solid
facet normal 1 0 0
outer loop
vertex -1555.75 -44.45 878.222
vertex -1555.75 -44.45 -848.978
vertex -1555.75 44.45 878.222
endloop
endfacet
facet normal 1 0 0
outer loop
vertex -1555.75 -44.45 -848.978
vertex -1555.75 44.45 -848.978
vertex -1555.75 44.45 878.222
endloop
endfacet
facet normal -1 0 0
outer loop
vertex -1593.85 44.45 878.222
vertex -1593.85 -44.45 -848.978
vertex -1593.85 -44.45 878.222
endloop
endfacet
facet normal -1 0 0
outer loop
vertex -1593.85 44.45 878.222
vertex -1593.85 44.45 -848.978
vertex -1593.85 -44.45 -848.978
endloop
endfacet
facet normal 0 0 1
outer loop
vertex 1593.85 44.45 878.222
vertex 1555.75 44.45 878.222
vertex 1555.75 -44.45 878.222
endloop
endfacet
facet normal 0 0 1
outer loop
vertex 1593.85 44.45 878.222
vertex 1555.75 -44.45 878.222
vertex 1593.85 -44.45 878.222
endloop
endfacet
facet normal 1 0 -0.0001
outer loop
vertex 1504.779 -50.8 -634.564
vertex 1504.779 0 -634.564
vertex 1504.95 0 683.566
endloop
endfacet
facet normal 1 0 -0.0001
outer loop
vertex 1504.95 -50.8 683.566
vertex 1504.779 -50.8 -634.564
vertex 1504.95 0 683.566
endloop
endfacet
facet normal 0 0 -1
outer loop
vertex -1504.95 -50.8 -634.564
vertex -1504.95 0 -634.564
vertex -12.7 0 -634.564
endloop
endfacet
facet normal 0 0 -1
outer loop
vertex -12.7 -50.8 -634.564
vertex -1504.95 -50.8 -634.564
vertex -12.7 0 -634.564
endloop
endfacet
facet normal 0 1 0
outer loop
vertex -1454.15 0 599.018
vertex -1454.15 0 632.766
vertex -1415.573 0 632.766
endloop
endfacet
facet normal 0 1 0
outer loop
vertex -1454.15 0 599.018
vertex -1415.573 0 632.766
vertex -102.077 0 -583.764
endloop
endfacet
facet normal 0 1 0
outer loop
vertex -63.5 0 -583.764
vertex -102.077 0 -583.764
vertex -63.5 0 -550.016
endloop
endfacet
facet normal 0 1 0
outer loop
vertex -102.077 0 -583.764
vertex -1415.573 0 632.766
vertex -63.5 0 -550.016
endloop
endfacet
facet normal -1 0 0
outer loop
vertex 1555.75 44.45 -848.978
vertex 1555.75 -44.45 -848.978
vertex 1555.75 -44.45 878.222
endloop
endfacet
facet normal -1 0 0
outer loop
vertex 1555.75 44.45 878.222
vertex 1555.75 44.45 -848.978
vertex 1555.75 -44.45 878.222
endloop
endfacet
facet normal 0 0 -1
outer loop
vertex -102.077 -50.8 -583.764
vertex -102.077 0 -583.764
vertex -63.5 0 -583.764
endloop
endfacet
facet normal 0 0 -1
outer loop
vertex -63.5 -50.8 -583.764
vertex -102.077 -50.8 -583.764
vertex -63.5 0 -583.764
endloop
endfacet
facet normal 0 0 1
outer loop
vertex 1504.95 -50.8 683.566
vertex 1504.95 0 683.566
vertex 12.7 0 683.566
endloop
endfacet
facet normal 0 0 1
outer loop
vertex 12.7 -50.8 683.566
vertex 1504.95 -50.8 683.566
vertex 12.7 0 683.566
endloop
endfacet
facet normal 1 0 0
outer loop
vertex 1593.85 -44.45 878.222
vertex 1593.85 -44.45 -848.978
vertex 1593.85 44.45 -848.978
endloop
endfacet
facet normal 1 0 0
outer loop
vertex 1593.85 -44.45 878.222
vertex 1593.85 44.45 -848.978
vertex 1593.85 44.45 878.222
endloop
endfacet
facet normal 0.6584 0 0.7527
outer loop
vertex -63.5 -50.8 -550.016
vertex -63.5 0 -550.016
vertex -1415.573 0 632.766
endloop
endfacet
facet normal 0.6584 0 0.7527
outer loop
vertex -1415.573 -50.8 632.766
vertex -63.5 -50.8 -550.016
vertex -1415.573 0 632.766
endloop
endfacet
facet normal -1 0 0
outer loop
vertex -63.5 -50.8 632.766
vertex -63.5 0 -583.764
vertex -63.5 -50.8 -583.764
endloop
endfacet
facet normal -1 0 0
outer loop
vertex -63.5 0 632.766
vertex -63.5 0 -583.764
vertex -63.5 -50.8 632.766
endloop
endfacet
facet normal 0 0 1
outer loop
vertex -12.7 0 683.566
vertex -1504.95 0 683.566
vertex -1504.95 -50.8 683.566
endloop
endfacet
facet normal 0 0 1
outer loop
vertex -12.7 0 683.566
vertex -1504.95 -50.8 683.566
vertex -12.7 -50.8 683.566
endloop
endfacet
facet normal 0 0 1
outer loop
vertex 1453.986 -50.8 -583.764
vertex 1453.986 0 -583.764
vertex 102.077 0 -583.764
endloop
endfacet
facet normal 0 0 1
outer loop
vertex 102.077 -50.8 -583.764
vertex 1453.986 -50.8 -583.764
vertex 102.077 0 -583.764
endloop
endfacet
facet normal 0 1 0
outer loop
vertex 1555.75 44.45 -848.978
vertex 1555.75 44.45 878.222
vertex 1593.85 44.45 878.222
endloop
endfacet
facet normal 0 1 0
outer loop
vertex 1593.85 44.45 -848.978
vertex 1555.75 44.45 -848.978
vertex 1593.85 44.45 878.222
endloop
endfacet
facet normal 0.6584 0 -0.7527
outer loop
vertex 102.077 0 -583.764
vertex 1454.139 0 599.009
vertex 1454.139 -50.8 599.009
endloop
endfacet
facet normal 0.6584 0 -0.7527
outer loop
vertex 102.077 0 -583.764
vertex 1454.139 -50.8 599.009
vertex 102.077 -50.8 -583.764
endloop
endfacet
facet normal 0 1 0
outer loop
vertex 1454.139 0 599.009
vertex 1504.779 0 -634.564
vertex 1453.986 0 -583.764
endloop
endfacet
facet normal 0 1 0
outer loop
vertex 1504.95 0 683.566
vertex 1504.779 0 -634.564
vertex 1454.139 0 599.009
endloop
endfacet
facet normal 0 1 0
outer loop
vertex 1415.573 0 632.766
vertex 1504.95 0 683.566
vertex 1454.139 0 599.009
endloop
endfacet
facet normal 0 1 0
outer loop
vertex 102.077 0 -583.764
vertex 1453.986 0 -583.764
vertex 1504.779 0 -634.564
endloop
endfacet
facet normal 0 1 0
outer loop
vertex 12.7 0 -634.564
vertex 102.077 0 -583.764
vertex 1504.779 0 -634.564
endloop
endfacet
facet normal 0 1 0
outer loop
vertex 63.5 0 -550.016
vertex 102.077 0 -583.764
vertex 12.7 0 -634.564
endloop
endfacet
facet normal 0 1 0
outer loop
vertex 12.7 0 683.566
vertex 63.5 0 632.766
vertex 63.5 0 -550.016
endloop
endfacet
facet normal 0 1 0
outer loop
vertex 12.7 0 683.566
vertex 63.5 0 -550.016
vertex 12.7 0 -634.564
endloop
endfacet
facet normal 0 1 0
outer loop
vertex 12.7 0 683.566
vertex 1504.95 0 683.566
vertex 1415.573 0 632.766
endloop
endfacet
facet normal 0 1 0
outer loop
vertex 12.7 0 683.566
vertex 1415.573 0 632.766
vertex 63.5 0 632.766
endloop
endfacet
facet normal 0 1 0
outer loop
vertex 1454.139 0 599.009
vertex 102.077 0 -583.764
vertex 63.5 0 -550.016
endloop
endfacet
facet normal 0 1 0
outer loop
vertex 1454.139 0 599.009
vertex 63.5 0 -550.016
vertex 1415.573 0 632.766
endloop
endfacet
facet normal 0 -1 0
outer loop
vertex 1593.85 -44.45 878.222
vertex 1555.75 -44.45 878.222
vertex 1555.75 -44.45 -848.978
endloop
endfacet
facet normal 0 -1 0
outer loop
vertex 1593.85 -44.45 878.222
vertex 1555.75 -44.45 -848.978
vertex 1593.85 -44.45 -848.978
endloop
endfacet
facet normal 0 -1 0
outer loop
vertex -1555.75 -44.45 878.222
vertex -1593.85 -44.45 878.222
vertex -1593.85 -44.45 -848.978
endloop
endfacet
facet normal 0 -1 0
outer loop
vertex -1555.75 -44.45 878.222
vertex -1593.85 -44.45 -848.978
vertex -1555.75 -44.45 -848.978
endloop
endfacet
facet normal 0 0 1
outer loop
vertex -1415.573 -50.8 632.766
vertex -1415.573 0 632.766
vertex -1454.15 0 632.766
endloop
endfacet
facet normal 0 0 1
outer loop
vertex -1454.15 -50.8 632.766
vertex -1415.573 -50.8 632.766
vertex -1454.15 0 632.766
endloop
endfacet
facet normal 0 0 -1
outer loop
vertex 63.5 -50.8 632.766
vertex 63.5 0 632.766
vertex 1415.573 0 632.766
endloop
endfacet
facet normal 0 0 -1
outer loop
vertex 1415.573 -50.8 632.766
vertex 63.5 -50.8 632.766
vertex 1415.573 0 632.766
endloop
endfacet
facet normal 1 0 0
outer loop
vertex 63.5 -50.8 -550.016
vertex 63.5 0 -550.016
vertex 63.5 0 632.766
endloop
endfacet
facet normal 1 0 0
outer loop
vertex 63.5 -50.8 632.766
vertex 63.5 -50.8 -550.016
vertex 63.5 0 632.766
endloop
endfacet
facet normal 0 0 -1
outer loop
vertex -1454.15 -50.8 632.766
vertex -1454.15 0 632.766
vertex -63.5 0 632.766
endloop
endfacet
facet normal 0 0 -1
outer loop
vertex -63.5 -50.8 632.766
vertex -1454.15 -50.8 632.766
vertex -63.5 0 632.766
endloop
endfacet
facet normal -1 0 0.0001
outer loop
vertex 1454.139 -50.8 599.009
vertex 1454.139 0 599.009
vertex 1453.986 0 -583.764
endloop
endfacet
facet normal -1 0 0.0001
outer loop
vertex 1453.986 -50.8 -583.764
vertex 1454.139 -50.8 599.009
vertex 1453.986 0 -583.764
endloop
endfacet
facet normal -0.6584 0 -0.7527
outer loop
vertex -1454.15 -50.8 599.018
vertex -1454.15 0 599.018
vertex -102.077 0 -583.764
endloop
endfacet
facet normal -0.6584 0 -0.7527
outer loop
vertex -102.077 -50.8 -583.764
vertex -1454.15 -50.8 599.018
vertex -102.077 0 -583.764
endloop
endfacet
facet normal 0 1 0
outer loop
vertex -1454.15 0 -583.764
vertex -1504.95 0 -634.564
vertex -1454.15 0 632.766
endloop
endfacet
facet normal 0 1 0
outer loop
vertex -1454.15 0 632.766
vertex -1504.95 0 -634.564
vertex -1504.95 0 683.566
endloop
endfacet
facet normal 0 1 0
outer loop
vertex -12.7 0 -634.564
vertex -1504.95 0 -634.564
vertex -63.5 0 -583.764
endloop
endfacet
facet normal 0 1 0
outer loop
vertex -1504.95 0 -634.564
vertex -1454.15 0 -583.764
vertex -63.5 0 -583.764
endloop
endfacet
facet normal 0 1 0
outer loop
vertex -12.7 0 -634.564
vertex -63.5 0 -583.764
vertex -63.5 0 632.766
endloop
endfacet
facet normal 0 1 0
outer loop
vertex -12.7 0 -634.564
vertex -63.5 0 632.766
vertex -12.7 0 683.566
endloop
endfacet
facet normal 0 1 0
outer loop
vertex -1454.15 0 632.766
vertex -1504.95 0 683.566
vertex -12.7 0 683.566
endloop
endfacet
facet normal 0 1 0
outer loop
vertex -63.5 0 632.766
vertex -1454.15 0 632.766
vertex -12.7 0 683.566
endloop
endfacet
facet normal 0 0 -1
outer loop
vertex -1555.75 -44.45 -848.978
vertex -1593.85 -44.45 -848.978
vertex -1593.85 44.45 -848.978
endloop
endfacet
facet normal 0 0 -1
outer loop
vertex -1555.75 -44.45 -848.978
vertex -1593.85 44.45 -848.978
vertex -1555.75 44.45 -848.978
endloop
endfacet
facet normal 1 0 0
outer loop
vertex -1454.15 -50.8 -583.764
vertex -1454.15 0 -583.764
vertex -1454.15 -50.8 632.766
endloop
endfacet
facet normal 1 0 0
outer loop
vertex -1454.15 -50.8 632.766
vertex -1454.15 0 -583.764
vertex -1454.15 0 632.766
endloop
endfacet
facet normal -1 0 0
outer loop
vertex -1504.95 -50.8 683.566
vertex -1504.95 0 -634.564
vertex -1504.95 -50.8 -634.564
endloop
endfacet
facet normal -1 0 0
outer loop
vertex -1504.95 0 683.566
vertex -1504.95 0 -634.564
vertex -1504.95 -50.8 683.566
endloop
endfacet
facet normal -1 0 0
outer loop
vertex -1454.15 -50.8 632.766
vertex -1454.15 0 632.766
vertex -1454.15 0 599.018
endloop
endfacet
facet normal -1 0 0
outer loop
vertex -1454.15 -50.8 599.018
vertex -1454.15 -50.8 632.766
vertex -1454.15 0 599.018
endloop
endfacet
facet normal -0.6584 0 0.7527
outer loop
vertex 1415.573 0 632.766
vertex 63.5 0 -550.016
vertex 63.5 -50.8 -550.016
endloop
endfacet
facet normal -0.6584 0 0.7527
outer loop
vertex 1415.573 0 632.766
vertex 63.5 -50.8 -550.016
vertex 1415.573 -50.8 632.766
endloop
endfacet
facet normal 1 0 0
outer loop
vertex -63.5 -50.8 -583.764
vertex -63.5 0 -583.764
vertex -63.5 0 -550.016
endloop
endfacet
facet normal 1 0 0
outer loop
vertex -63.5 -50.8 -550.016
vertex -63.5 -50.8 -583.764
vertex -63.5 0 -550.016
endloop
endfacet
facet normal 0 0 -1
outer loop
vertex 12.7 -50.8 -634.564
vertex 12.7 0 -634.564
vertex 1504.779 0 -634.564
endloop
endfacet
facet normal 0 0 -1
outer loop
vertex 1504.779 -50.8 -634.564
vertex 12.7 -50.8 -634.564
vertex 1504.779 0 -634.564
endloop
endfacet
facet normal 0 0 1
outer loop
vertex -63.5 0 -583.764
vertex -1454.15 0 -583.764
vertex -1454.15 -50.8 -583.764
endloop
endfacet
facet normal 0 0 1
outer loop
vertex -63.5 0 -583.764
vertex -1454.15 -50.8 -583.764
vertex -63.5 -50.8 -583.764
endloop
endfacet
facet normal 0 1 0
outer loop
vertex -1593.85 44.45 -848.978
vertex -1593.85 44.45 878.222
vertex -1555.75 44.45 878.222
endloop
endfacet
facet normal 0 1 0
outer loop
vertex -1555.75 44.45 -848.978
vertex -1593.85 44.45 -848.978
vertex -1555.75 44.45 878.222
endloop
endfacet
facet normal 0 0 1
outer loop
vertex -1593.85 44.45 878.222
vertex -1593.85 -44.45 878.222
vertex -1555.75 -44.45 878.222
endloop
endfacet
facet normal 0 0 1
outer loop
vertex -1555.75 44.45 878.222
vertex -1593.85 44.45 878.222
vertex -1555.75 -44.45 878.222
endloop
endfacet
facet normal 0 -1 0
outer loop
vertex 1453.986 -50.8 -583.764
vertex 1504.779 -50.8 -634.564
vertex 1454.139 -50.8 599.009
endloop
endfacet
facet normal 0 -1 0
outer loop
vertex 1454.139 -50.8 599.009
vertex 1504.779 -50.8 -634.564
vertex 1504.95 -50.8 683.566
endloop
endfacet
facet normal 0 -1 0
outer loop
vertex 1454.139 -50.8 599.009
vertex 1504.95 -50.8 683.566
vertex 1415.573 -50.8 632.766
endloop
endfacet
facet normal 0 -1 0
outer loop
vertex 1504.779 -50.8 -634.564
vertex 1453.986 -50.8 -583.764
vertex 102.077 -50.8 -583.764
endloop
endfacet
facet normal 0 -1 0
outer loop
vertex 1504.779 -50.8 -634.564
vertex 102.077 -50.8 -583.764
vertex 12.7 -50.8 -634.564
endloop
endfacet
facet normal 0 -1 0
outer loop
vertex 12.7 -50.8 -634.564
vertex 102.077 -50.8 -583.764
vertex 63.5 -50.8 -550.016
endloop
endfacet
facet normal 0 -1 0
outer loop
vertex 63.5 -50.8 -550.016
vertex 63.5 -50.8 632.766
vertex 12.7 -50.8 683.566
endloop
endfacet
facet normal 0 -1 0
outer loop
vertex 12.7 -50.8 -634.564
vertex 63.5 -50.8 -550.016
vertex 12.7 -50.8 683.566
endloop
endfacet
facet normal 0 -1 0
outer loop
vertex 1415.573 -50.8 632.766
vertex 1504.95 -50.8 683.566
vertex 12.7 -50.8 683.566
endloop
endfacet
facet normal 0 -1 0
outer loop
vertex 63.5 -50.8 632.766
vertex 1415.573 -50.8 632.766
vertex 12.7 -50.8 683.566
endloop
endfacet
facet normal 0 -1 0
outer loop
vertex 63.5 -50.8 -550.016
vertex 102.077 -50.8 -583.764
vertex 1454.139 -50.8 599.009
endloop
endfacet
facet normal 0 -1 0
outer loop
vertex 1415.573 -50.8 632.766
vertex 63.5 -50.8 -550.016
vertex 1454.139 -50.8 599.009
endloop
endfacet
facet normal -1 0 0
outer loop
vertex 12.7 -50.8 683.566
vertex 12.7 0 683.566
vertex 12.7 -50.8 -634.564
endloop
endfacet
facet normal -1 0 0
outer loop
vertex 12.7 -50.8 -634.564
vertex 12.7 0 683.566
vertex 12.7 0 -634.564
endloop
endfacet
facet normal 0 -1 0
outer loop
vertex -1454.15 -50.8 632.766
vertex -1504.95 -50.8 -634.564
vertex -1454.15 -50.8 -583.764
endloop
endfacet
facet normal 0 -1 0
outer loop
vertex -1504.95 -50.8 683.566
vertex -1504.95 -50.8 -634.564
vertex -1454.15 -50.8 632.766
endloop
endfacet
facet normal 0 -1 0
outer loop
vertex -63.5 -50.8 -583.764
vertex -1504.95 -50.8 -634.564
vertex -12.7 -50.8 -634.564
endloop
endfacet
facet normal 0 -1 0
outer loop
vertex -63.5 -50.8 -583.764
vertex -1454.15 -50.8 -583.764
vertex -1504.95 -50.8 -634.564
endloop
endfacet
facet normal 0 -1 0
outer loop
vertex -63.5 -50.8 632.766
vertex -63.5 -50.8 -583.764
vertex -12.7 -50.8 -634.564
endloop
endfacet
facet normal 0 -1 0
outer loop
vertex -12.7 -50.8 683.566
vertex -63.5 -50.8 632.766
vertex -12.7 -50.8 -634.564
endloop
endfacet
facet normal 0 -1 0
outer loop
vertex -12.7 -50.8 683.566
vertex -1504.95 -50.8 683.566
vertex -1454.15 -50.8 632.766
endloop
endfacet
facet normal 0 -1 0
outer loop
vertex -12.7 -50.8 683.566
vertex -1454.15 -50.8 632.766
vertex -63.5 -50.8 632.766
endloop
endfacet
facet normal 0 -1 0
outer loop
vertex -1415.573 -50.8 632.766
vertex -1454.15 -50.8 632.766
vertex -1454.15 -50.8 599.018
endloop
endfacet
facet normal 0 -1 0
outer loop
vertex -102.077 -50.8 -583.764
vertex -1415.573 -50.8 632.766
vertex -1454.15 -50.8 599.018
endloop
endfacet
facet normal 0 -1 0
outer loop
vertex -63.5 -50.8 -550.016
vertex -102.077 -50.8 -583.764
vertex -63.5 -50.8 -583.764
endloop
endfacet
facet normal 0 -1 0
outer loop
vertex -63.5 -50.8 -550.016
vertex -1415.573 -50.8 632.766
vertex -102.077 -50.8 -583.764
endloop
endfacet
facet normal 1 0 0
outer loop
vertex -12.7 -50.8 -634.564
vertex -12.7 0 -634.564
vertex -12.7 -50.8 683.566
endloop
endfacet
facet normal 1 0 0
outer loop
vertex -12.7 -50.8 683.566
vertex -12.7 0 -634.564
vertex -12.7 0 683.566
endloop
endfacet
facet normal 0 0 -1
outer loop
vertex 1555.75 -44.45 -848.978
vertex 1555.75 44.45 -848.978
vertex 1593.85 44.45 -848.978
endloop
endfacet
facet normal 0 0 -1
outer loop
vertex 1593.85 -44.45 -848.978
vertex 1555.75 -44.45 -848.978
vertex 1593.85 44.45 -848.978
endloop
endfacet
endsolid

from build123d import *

# Parameters (mm, degrees)
F0_W     = 38.1
F0_H     = 1727.2
F1_DEPTH = 44.45
F3_W     = 1492.25
F3_H     = 1318.129241
F3_W_2   = 1390.65
F3_H_2   = 1216.529241
F4_DEPTH = 50.8
F6_DEPTH = 50.8


with BuildPart() as f1:
    # F0 (on Front) → F1 (new body, symmetric)
    with BuildSketch(Plane.XZ):
        with Locations((-1574.8, 14.621863)):
            Rectangle(F0_W, F0_H)
        with Locations((1574.8, 14.621863)):
            Rectangle(F0_W, F0_H)
    extrude(amount=F1_DEPTH, both=True)


with BuildPart() as f4:
    # F3 (on Front) → F4 (new body)
    with BuildSketch(Plane.XZ):
        with Locations((-758.825, 24.501056)):
            Rectangle(F3_W, F3_H)
        with Locations((-758.825, 24.501056)):
            Rectangle(F3_W_2, F3_H_2, mode=Mode.SUBTRACT)
        Polygon((12.7, -634.563565), (1504.77922, -634.563565), (1504.95, 683.565676), (12.7, 683.565676), align=None)
        Polygon((63.5, -583.763565), (63.5, 632.765676), (1454.143418, 632.765676), (1453.985801, -583.763565), align=None, mode=Mode.SUBTRACT)
    extrude(amount=F4_DEPTH)

    # F7: F6 across plane


with BuildPart() as f6:
    # F5 (on Front) → F6 (new body)
    with BuildSketch(Plane.XZ):
        Polygon((-63.5, -550.016334), (-1415.572557, 632.765676), (-1454.15, 632.765676), (-1454.15, 599.018445), (-102.077443, -583.763565), (-63.5, -583.763565), align=None)
    extrude(amount=F6_DEPTH)


with BuildPart() as f4_1:
    add(f4.part)
    add(f6.part.mirror(Plane.YZ))


solid = Compound([f1.part, f6.part, f4_1.part])
